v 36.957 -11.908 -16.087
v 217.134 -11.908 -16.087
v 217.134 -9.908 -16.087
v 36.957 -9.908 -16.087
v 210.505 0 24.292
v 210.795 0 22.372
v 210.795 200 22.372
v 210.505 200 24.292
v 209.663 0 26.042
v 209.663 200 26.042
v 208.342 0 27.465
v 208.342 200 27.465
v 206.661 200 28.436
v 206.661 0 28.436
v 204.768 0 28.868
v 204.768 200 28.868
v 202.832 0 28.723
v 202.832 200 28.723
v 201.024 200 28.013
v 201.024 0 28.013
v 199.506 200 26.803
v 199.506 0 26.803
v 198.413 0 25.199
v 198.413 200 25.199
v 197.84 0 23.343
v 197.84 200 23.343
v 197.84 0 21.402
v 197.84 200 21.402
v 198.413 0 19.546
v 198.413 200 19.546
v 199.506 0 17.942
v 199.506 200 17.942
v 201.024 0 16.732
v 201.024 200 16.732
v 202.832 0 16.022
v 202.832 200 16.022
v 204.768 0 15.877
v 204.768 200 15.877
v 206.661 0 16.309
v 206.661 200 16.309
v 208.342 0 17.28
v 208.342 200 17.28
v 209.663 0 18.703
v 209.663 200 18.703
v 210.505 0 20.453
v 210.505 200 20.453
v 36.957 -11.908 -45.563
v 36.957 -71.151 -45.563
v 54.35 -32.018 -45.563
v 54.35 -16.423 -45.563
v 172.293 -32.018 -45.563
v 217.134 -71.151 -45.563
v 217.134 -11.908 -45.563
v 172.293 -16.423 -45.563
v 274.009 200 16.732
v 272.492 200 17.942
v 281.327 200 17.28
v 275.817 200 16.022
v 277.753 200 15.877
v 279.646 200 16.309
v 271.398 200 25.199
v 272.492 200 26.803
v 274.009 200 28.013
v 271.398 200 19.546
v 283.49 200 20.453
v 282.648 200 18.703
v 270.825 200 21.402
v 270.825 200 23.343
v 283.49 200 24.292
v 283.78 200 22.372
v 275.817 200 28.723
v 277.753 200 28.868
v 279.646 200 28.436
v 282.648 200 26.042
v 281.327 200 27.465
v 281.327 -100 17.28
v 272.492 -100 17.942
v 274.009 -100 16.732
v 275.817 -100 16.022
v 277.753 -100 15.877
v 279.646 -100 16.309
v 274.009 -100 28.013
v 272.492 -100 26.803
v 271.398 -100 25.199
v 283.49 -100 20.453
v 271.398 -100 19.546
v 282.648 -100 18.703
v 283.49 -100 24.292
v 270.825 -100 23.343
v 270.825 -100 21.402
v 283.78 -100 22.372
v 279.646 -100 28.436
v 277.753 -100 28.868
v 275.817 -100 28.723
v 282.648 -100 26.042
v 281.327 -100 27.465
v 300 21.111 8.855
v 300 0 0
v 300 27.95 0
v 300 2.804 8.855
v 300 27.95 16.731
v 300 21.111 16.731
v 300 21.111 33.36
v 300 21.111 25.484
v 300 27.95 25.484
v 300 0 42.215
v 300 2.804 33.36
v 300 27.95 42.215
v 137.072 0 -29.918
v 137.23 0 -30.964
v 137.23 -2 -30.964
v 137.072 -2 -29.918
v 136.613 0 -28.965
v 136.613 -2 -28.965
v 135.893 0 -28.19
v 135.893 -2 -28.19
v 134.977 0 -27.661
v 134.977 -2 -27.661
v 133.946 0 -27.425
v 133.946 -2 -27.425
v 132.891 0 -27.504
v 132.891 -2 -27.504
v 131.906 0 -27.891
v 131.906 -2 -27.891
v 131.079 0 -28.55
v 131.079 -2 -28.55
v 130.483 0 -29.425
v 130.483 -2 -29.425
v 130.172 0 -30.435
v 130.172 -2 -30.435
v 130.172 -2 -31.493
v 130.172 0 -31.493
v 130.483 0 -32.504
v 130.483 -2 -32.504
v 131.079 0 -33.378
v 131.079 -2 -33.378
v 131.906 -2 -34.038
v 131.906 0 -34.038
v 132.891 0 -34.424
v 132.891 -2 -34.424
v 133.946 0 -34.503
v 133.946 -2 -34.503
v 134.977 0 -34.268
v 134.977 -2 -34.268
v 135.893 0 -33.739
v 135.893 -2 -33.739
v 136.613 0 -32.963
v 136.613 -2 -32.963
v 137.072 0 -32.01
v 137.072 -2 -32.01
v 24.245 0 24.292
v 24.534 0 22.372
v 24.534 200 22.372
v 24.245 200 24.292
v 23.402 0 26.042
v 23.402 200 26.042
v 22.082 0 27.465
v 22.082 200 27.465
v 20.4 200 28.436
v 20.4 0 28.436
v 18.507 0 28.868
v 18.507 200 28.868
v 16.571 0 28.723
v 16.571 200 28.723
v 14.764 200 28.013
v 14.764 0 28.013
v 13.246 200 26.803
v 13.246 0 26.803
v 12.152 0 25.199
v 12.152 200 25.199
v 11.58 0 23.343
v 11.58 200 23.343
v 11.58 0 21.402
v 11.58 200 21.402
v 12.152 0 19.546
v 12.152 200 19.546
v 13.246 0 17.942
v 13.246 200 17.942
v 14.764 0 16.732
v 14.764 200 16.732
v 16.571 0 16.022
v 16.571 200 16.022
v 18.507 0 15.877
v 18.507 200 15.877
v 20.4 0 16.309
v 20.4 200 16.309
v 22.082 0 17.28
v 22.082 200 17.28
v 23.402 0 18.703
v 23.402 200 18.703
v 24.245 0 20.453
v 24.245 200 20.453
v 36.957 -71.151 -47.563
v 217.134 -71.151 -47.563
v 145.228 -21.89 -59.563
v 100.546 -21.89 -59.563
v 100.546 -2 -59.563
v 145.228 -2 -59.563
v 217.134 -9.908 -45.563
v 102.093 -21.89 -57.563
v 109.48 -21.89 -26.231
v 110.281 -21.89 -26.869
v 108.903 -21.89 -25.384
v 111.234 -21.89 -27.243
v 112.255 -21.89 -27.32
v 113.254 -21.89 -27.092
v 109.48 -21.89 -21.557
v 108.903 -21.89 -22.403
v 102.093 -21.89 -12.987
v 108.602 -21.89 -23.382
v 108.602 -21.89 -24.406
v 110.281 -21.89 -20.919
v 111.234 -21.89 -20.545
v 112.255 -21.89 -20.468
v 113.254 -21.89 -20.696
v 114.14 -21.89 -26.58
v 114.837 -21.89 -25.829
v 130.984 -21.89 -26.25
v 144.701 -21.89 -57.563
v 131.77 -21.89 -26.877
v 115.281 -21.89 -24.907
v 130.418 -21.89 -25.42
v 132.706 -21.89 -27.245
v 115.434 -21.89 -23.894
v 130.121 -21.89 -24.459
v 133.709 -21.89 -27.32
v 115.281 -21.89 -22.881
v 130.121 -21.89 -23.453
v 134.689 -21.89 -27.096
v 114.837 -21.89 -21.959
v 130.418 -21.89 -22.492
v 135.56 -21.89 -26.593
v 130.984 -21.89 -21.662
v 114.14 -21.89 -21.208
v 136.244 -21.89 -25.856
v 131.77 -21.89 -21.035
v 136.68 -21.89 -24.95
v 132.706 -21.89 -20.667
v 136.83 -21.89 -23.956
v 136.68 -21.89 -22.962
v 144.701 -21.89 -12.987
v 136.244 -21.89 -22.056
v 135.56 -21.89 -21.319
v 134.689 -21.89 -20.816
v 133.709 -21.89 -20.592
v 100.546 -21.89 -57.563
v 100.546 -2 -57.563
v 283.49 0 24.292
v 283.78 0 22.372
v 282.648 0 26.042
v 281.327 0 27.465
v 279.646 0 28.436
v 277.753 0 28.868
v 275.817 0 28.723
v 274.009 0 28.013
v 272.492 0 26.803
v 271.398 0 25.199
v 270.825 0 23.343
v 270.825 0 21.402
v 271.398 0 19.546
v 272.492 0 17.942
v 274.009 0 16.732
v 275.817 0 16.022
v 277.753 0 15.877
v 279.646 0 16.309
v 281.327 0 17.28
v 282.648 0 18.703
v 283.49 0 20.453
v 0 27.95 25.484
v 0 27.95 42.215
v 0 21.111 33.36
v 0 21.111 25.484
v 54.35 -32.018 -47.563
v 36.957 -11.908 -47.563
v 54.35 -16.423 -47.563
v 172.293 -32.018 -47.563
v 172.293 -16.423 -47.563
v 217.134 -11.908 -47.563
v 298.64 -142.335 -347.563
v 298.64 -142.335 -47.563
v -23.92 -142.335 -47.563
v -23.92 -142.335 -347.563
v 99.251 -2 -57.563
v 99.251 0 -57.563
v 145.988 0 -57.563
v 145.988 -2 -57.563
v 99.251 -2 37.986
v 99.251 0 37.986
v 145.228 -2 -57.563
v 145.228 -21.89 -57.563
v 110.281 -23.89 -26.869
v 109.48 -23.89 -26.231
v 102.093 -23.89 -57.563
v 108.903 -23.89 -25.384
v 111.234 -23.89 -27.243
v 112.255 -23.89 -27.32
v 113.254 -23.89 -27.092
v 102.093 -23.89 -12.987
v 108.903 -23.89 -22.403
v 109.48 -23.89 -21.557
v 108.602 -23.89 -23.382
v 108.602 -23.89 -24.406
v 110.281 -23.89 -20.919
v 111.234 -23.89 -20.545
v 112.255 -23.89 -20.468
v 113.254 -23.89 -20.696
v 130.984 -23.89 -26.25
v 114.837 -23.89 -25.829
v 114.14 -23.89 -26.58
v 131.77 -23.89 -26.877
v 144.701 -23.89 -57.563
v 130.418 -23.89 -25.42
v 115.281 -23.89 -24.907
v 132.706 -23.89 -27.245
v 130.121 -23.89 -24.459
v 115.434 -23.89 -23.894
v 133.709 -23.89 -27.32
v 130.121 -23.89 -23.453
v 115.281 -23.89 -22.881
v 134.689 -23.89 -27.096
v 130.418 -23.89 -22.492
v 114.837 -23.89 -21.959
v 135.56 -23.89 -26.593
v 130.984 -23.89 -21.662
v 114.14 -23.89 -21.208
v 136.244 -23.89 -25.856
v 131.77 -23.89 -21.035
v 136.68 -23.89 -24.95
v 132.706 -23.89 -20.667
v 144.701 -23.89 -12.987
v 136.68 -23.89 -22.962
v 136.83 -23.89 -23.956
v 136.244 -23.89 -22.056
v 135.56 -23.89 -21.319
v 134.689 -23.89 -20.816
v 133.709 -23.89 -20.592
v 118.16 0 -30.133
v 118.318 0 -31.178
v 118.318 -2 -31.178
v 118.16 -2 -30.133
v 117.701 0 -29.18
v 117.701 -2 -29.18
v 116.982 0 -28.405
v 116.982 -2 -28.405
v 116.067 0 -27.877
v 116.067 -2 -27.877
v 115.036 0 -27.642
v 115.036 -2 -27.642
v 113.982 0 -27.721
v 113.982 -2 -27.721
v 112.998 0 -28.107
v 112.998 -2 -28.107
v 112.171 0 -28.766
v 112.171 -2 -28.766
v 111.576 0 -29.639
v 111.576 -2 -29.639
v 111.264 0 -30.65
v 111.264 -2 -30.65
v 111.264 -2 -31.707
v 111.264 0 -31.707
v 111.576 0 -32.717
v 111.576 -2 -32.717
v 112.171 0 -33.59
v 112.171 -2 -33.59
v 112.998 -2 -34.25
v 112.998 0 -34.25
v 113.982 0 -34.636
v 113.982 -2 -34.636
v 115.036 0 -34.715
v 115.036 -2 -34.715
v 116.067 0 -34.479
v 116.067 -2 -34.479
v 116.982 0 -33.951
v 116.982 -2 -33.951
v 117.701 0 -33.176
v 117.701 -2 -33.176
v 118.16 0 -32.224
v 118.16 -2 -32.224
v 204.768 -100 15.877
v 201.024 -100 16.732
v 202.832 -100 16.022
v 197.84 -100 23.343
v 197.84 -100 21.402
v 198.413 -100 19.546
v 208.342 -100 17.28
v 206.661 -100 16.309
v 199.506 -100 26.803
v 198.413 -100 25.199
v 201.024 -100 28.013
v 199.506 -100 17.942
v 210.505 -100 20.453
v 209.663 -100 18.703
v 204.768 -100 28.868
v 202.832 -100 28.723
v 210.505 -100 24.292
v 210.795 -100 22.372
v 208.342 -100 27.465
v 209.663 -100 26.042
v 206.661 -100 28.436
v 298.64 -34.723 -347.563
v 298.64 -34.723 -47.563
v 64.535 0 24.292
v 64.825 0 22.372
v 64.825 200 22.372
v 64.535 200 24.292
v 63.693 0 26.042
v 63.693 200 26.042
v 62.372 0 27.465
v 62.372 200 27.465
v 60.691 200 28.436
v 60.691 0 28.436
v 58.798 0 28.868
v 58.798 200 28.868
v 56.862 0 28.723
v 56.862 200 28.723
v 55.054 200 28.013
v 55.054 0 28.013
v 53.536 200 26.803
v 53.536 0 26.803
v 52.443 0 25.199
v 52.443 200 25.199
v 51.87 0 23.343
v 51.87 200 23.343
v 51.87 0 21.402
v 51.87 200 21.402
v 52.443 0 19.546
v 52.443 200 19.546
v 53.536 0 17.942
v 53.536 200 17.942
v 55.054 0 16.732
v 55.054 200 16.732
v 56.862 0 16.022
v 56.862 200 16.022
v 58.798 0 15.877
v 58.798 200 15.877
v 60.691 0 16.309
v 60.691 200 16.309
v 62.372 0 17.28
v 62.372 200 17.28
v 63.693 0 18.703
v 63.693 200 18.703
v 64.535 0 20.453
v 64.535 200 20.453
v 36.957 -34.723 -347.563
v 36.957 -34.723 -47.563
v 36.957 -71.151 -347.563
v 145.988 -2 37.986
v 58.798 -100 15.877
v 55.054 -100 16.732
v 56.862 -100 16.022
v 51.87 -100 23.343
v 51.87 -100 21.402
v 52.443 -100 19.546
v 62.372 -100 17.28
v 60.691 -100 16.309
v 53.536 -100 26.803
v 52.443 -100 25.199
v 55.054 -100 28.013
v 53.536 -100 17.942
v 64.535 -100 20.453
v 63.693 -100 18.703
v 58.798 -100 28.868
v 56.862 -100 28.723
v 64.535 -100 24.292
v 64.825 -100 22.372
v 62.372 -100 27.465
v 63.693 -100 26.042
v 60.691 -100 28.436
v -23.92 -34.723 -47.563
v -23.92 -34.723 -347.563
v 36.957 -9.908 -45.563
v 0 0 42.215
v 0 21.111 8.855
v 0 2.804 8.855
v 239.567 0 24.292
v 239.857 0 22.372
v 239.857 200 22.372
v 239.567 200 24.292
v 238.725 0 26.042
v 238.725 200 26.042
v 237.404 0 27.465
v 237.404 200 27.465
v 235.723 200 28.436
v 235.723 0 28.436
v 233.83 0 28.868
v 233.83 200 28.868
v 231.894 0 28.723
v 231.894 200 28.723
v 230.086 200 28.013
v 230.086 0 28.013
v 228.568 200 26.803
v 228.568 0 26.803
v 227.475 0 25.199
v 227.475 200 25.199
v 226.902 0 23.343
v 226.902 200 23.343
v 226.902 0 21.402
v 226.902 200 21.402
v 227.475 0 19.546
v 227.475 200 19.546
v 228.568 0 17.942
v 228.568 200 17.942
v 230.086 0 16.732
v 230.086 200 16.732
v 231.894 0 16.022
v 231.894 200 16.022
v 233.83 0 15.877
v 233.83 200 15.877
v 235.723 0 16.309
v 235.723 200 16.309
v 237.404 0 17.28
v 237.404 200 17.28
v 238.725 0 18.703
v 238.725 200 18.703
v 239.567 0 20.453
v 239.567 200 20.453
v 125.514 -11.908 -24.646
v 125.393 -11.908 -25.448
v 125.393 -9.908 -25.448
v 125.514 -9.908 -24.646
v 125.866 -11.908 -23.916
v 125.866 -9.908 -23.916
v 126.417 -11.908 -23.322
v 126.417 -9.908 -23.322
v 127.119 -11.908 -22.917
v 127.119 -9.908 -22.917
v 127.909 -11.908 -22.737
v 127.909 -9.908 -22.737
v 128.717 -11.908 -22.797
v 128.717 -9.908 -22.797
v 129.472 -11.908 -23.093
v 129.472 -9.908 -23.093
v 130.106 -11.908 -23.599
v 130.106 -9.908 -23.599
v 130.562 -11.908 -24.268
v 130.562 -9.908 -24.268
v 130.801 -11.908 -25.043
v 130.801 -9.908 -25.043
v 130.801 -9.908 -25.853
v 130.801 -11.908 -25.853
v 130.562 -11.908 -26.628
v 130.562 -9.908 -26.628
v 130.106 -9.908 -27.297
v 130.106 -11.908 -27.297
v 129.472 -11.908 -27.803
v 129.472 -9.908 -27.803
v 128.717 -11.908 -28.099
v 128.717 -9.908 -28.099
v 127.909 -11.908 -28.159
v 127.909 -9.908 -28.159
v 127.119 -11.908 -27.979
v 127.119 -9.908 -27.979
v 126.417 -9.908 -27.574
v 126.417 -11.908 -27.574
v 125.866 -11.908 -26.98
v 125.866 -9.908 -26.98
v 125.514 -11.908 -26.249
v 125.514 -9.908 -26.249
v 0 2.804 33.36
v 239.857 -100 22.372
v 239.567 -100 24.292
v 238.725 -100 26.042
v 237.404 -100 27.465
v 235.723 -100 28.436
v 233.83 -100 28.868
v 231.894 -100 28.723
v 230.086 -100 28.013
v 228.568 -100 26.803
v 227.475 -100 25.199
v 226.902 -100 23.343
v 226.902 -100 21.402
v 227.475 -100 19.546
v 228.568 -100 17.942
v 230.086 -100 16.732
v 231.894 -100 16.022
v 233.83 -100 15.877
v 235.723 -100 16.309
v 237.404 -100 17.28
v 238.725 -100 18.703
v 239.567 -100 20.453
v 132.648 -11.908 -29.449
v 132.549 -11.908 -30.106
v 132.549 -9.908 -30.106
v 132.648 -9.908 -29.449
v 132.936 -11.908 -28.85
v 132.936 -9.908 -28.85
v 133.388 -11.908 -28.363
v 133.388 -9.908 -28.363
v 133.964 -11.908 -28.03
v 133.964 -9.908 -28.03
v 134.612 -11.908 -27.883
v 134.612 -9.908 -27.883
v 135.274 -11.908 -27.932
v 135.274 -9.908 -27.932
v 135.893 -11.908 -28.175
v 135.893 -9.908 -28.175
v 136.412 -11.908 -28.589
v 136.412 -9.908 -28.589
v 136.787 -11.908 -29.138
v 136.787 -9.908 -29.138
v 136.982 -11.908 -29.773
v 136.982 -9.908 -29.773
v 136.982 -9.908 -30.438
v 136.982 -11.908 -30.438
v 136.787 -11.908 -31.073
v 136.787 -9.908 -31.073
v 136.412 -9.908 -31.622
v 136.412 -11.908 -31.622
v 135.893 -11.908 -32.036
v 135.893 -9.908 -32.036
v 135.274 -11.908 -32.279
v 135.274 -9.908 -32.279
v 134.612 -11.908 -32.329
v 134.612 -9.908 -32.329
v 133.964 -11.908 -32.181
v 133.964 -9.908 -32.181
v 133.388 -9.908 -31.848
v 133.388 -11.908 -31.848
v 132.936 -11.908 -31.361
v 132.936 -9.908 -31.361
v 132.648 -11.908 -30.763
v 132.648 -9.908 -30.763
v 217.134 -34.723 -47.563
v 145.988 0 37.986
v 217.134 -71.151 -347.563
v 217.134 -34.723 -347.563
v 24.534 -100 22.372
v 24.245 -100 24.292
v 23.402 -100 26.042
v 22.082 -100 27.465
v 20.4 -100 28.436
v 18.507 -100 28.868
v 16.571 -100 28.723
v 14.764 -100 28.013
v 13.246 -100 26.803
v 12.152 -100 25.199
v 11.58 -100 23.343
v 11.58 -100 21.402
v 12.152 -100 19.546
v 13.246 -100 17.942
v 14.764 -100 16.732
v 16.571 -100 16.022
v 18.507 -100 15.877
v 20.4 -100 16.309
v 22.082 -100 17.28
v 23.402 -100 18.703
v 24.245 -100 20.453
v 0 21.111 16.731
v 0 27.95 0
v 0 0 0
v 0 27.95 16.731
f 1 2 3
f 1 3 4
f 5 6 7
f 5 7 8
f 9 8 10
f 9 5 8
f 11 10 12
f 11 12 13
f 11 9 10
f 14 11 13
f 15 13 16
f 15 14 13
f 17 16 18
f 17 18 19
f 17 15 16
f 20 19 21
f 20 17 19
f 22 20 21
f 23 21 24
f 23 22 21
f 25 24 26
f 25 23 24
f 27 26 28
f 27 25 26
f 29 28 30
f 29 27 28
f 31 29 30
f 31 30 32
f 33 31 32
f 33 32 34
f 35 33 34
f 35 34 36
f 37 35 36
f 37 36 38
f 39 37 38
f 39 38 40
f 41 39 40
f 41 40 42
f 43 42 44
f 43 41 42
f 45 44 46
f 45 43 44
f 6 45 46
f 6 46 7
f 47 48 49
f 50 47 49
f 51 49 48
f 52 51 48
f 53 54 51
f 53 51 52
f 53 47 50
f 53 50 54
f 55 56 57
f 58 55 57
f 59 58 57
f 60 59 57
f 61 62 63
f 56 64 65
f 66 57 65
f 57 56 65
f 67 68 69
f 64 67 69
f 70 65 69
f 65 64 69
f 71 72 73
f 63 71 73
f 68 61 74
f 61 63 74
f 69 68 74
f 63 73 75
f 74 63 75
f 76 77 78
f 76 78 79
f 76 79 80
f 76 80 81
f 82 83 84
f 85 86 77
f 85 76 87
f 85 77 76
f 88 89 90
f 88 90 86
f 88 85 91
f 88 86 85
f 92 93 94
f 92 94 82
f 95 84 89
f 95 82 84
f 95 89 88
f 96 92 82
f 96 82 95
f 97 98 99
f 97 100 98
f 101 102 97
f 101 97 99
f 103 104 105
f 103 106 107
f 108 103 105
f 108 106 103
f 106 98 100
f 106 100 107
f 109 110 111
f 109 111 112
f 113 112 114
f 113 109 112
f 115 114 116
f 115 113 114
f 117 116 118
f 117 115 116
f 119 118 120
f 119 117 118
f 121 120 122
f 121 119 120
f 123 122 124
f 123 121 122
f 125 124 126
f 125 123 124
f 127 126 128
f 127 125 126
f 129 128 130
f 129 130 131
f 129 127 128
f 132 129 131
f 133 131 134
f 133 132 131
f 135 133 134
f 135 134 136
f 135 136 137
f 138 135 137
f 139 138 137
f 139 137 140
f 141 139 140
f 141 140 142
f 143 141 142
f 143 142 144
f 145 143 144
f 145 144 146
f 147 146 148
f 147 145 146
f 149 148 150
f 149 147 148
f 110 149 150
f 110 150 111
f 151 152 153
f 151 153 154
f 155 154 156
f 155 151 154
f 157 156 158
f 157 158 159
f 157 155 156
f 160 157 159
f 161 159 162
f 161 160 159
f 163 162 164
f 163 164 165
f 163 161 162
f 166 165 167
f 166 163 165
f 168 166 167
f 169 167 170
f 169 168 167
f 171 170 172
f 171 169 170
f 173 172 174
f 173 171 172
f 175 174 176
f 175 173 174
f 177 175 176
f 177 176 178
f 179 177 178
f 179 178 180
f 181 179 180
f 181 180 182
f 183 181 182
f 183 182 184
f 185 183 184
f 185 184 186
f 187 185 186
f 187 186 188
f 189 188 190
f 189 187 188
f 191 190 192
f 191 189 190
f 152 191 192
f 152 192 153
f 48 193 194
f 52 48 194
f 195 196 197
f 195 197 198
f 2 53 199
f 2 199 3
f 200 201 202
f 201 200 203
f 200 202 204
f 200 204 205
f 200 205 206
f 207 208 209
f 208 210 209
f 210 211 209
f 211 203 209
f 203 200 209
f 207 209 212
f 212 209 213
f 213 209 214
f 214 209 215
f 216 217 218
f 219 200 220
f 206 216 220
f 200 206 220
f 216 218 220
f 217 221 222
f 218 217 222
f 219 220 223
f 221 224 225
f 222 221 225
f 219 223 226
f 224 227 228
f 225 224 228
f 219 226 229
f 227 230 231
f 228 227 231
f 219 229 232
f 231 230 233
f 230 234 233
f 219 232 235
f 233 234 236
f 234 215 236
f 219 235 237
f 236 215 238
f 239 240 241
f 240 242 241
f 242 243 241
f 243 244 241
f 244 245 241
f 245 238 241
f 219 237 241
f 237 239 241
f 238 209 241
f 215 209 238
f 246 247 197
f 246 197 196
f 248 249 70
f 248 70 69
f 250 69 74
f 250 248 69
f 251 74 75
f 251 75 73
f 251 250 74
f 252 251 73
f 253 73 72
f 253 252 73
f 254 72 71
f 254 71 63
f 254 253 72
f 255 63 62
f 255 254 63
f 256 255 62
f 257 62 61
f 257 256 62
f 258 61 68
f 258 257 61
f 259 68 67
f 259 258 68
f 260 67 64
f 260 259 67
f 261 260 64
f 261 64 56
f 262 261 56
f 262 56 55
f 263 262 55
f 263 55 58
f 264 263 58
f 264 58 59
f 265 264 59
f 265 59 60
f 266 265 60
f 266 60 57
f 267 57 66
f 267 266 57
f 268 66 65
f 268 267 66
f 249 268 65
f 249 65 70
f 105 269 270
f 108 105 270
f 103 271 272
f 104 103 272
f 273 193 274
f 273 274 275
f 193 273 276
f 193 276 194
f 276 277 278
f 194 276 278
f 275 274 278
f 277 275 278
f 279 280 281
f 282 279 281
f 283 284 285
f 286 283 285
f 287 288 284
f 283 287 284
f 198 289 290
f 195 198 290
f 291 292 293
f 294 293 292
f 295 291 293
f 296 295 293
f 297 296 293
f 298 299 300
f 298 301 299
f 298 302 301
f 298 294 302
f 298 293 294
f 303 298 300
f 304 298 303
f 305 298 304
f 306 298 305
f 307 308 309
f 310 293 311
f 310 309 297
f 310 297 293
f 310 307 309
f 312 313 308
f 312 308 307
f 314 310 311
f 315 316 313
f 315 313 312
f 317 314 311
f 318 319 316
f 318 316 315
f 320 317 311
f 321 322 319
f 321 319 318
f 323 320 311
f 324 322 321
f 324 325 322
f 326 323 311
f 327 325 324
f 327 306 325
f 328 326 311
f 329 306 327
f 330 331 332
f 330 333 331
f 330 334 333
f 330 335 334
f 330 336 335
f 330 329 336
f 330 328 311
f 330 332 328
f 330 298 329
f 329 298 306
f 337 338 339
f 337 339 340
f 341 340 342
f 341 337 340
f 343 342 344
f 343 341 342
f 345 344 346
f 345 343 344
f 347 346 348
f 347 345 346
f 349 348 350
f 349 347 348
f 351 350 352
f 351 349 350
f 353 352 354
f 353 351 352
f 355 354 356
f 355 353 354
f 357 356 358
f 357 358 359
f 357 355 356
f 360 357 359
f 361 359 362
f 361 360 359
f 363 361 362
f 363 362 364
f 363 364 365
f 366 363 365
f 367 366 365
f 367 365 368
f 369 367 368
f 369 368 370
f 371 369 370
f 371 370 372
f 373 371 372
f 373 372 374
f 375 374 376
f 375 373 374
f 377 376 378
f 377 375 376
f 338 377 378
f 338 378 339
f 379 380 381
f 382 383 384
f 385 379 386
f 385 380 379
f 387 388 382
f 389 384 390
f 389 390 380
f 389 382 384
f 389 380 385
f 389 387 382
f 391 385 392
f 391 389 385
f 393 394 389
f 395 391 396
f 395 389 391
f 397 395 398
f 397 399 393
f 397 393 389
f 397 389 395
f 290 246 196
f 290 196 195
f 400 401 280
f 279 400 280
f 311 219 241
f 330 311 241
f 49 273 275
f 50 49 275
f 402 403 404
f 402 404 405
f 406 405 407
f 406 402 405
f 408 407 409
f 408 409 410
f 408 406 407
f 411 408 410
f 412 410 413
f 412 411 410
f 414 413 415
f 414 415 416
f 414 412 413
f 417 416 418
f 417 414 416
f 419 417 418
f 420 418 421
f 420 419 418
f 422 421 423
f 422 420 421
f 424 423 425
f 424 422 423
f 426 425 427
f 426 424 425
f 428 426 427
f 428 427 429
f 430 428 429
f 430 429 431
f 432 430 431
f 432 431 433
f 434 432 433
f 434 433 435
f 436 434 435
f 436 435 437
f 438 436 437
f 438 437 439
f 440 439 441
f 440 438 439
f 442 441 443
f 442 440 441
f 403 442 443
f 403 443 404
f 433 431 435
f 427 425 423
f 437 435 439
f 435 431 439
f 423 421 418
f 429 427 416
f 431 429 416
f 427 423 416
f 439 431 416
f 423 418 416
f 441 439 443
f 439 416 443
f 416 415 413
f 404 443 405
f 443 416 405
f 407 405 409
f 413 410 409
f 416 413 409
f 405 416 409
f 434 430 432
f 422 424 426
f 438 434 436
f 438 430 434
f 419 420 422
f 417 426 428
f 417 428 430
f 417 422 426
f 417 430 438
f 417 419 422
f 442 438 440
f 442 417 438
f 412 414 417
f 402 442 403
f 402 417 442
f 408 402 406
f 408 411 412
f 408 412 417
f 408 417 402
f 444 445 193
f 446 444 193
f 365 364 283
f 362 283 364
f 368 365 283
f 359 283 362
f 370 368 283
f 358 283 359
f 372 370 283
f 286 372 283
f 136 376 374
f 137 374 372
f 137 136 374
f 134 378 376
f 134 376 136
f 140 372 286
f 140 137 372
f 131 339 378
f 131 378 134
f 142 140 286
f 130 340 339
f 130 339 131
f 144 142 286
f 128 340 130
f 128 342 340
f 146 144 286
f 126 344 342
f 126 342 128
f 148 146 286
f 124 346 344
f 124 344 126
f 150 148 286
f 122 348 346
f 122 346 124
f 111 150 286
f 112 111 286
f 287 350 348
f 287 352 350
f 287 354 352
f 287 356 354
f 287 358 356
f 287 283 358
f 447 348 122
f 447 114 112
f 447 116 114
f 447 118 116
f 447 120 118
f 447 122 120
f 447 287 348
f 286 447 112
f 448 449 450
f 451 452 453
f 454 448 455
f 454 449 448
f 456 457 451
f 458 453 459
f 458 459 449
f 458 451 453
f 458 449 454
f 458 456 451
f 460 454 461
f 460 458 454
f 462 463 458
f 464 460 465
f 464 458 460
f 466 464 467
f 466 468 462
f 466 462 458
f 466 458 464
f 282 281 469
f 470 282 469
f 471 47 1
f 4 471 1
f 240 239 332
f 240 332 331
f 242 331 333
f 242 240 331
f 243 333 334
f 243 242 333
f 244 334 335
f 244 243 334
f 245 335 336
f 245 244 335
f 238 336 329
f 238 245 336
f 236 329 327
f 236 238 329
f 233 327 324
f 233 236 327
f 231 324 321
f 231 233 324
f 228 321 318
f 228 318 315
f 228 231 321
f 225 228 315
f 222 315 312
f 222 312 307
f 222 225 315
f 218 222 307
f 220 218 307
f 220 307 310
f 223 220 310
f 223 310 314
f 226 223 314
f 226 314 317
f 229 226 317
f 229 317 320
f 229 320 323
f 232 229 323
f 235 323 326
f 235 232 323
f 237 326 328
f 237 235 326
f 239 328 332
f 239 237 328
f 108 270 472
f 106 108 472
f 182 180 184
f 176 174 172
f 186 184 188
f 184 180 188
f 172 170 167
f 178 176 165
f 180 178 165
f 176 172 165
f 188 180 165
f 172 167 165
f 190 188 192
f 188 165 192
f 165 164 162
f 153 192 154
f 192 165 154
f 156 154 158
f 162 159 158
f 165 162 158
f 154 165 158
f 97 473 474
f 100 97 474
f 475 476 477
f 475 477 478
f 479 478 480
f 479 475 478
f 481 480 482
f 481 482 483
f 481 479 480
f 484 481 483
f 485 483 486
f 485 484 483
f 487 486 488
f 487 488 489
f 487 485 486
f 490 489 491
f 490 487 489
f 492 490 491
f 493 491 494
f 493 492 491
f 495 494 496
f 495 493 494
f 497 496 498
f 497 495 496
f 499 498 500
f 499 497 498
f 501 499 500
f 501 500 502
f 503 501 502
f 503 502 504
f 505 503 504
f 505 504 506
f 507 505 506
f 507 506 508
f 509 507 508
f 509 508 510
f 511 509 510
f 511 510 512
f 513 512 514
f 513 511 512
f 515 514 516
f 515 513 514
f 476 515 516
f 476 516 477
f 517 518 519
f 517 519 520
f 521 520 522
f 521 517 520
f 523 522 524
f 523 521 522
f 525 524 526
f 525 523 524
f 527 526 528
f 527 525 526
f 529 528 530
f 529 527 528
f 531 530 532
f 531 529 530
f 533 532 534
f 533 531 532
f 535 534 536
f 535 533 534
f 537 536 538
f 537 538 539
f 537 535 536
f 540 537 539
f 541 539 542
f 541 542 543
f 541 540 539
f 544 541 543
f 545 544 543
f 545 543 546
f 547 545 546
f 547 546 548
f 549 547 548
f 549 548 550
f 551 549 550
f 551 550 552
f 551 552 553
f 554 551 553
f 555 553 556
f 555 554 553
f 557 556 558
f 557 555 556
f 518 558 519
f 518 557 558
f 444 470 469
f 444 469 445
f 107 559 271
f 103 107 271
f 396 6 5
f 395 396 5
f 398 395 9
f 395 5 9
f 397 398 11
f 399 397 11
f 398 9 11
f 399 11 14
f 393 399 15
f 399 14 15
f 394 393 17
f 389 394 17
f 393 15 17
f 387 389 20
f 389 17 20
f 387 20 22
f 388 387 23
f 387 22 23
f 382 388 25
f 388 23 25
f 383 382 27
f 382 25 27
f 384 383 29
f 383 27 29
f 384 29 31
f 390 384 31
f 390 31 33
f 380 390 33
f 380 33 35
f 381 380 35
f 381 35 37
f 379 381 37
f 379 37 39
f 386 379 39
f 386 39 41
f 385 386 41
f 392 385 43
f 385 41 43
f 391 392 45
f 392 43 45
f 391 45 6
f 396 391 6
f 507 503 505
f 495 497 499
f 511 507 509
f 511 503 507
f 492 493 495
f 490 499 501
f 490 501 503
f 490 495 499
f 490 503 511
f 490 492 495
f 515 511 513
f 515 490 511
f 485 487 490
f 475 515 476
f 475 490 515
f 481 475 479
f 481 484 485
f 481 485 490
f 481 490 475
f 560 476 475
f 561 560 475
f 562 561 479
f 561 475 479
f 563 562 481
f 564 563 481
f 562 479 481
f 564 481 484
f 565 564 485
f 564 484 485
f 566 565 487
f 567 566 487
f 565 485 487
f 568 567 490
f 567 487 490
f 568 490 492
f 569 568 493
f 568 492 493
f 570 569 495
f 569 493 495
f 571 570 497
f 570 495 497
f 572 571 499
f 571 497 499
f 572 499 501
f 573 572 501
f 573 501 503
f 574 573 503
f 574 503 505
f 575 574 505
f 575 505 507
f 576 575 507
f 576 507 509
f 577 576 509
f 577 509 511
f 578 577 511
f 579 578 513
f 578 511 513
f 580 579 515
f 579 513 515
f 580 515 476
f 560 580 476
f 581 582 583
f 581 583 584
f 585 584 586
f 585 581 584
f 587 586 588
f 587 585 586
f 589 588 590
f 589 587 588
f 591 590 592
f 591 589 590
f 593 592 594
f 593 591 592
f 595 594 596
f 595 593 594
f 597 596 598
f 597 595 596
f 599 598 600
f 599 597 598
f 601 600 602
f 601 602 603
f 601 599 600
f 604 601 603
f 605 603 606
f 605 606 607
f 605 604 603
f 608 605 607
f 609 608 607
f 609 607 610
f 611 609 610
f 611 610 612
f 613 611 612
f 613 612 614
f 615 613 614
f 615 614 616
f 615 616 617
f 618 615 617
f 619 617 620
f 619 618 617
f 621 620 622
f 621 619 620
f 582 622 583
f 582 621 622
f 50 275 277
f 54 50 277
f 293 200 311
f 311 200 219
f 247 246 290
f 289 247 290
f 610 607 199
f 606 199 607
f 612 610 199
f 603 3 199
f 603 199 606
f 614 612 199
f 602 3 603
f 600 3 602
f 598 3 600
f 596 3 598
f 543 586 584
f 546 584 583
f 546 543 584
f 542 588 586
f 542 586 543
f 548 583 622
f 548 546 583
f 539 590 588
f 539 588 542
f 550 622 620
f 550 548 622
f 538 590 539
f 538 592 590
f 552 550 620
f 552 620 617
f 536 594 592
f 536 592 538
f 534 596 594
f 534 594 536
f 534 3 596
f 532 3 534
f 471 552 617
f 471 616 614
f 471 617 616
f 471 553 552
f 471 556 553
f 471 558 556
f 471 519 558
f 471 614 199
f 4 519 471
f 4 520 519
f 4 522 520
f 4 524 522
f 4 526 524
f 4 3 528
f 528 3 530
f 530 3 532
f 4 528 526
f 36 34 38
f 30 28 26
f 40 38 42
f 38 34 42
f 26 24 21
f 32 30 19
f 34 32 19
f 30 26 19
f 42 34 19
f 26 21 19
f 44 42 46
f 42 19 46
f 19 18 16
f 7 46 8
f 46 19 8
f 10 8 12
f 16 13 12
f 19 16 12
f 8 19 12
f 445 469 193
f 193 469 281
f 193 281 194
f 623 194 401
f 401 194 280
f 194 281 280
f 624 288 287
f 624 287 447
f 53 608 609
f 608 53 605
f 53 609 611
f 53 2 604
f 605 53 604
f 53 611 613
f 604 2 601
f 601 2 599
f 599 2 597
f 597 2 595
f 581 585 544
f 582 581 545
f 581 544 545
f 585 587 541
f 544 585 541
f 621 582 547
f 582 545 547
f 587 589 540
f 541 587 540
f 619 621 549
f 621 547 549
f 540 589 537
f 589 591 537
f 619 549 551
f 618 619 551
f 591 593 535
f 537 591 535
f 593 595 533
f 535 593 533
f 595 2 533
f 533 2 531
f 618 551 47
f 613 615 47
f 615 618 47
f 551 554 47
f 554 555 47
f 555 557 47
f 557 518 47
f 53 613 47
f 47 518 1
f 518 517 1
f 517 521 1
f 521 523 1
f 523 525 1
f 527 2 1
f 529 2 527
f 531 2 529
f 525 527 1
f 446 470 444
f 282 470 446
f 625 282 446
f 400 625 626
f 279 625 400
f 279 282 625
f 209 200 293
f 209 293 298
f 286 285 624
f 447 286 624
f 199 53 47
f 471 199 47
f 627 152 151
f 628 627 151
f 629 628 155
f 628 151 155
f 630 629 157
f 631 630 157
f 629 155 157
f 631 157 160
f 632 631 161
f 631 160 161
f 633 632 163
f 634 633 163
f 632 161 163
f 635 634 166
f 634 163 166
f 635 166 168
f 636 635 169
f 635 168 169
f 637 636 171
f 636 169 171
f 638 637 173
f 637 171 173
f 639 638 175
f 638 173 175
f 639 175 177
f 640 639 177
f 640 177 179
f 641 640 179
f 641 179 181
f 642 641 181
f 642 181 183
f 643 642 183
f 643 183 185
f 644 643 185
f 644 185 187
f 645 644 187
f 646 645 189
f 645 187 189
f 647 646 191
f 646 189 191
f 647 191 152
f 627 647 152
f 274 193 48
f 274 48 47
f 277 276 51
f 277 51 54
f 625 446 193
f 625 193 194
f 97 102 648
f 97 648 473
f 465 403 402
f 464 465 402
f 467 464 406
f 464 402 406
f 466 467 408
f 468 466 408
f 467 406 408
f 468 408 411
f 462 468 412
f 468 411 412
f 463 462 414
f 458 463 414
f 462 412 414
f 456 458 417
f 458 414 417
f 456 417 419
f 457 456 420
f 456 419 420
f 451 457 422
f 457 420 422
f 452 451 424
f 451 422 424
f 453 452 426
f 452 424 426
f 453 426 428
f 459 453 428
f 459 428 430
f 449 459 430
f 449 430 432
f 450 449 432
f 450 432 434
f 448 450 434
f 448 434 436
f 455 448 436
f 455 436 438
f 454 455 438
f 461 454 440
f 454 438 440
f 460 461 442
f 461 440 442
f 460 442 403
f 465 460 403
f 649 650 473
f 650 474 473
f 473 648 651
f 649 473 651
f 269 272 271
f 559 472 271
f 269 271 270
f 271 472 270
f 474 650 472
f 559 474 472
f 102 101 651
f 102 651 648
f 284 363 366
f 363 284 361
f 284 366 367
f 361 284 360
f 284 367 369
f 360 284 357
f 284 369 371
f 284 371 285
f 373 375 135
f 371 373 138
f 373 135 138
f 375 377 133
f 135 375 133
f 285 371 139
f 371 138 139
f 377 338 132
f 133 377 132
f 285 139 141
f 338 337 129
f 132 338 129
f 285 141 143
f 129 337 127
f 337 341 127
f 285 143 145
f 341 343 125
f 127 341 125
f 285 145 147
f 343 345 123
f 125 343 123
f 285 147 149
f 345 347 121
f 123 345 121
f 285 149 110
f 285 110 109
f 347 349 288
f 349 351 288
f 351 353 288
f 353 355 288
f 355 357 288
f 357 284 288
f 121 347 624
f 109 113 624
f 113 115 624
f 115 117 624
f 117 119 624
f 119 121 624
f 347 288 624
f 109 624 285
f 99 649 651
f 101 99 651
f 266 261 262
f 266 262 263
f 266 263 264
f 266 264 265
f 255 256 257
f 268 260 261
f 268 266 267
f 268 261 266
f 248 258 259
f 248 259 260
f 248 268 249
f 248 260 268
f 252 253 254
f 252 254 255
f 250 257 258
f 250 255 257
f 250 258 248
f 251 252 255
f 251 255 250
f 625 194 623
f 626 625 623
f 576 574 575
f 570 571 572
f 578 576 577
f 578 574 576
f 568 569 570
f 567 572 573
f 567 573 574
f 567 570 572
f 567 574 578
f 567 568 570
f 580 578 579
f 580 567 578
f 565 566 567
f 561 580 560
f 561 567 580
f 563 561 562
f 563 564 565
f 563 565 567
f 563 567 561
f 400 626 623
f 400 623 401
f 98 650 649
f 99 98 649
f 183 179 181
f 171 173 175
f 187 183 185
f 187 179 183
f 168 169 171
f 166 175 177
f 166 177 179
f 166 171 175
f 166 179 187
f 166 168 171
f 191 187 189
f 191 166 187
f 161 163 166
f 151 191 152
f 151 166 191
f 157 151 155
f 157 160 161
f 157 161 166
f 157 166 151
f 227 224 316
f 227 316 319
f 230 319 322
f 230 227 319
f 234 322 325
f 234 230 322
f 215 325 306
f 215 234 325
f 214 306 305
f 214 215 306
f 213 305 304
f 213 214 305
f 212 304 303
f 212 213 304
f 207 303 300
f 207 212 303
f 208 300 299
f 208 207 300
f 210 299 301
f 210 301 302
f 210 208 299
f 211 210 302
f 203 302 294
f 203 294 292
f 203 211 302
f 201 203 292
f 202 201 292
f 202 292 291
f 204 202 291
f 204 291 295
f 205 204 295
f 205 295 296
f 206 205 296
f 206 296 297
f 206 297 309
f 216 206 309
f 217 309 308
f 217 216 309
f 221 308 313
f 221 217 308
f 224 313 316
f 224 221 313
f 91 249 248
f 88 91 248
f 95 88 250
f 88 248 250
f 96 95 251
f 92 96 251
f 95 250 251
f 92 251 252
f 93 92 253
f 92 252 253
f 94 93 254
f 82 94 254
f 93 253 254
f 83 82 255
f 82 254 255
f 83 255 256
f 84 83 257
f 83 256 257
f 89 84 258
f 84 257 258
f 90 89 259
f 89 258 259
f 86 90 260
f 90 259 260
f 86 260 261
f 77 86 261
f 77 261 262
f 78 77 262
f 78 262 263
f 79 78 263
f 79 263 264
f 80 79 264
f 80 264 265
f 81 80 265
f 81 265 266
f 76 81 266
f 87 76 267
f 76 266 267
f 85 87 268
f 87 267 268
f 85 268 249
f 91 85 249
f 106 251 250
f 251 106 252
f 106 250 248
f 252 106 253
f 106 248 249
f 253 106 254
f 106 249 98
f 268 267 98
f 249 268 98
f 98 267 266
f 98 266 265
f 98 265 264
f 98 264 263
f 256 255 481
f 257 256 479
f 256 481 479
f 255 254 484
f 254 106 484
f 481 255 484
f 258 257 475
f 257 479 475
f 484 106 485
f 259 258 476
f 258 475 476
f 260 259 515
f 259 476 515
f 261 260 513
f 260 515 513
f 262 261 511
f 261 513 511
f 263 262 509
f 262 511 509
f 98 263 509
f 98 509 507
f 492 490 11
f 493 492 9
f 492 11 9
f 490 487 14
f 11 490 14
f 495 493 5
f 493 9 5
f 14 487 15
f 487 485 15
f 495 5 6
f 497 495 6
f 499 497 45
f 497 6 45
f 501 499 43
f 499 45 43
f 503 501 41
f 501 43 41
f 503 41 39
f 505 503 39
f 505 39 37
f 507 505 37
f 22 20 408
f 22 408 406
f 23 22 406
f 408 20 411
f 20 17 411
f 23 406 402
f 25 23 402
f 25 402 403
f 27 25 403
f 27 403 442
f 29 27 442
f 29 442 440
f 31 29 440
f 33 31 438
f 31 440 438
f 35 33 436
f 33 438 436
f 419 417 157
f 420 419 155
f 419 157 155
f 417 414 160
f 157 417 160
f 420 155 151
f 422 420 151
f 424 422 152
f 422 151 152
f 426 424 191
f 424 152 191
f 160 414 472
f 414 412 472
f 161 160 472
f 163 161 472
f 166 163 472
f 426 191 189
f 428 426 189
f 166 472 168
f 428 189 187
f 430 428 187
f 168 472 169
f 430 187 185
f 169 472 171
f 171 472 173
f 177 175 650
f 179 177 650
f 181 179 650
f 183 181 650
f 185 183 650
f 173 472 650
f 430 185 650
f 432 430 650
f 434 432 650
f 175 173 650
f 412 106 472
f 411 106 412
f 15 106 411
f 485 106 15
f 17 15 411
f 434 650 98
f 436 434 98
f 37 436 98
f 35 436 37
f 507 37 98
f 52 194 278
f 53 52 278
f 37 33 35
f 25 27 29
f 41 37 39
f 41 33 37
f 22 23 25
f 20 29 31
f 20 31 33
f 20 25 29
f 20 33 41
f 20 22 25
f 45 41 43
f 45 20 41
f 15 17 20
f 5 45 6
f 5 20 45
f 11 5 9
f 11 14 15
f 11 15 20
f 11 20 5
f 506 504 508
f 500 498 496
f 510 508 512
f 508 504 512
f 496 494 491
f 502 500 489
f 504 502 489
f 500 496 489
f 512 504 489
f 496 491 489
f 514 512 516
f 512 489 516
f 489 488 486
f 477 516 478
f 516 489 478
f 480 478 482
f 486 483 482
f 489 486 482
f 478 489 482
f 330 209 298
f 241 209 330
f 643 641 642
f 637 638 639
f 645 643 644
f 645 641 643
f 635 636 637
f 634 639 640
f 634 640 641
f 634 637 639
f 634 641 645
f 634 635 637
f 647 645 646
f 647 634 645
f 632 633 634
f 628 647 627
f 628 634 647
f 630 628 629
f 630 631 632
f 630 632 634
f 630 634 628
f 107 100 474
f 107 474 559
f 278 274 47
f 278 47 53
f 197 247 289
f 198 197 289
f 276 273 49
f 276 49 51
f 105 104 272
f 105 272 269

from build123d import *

# Parameters (mm, degrees)
F1_DEPTH  = 300
F2_W      = 46.7377305031
F2_H      = 37.9861071706
F2_H_2    = 57.5625300407
F2_R      = 3.5464845082
F2_R_2    = 3.5487842395
F3_DEPTH  = 2
F4_W      = 44.6821078658
F4_H      = 19.8899268657
F5_DEPTH  = 2
F6_W      = 42.6081120968
F6_H      = 44.5759128779
F6_R      = 3.435329419
F6_R_2    = 3.3732396527
F7_DEPTH  = 2
F9_W      = 180.1773458719
F9_H      = 59.2437896412
F9_W_2    = 117.9433763027
F9_H_2    = 15.5952386558
F10_DEPTH = 2
F11_W     = 180.1773458719
F11_H     = 29.4754692465
F11_R     = 2.2291737864
F11_R_2   = 2.7189611164
F12_DEPTH = 2
F14_DEPTH = 300
F15_R     = 6.5135337173
F16_DEPTH = 100
F17_DEPTH = 200


with BuildPart() as f1:
    # F0 (on Right) → F1 (new body)
    with BuildSketch(Plane.YZ):
        Polygon((0, 42.2146357596), (0, 0), (27.9495714174, 0), (27.9495714174, 16.7309522358), (21.111213831, 16.7309522358), (21.111213831, 8.854838892), (2.8035883623, 8.854838892), (2.8035883623, 33.3597968676), (21.111213831, 33.3597968676), (21.111213831, 25.4836835238), (27.9495714174, 25.4836835238), (27.9495714174, 42.2146357596), align=None)
    extrude(amount=F1_DEPTH)

    # F15 (on face) → F16 (join)
    with BuildSketch(Plane.XZ):
        with Locations((277.2662639618, 22.3724991083)):
            Circle(F15_R)
        with Locations((233.3431243896, 22.3724991083)):
            Circle(F15_R)
        with Locations((204.2811959982, 22.3724991083)):
            Circle(F15_R)
        with Locations((58.3110898733, 22.3724991083)):
            Circle(F15_R)
        with Locations((18.0206950754, 22.3724991083)):
            Circle(F15_R)
    extrude(amount=F16_DEPTH)


with BuildPart() as f3:
    # F2 (on face) → F3 (new body)
    with BuildSketch(Plane.XZ):
        with Locations((122.61942029, 18.9930535853)):
            Rectangle(F2_W, F2_H)
        with Locations((122.61942029, -28.7812650204)):
            Rectangle(F2_W, F2_H_2)
        with Locations((114.7710829973, -31.1781652272)):
            Circle(F2_R, mode=Mode.SUBTRACT)
        with Locations((133.6807757616, -30.9642702341)):
            Circle(F2_R_2, mode=Mode.SUBTRACT)
    extrude(amount=F3_DEPTH)


with BuildPart() as f5:
    # F4 (on face) → F5 (new body)
    with BuildSketch(Plane(origin=(0, 0, -57.5625300407), x_dir=(1, 0, 0), z_dir=(0, 0, -1))):
        with Locations((122.8873170912, 11.9449634328)):
            Rectangle(F4_W, F4_H)
    extrude(amount=F5_DEPTH)


with BuildPart() as f7:
    # F6 (on face) → F7 (new body)
    with BuildSketch(Plane.XZ.offset(21.8899268657)):
        with Locations((123.397231102, -35.2745736018)):
            Rectangle(F6_W, F6_H)
        with Locations((111.9984835386, -23.8939598203)):
            Circle(F6_R, mode=Mode.SUBTRACT)
        with Locations((133.4570199251, -23.9559654146)):
            Circle(F6_R_2, mode=Mode.SUBTRACT)
    extrude(amount=F7_DEPTH)


with BuildPart() as f10:
    # F9 (on offset) → F10 (new body)
    with BuildSketch(Plane.XY.offset(-47.5625300407)):
        with Locations((127.0454749465, -41.5296001593)):
            Rectangle(F9_W, F9_H)
        with Locations((113.3212447166, -24.2201592773)):
            Rectangle(F9_W_2, F9_H_2, mode=Mode.SUBTRACT)
    extrude(amount=F10_DEPTH)


with BuildPart() as f12:
    # F11 (on face) → F12 (new body)
    with BuildSketch(Plane(origin=(0, -11.9077053387, 0), x_dir=(-1, 0, 0), z_dir=(0, 1, 0))):
        with Locations((-127.0454749465, -30.8247954175)):
            Rectangle(F11_W, F11_H)
        with Locations((-134.77820158, -30.1055759192)):
            Circle(F11_R, mode=Mode.SUBTRACT)
        with Locations((-128.1123906374, -25.4479255527)):
            Circle(F11_R_2, mode=Mode.SUBTRACT)
    extrude(amount=F12_DEPTH)


with BuildPart() as f14:
    # F13 (on face) → F14 (new body)
    with BuildSketch(Plane(origin=(0, 0, -47.5625300407), x_dir=(1, 0, 0), z_dir=(0, 0, -1))):
        Polygon((298.6398339272, 142.3349231482), (-23.9203404635, 142.3349231482), (-23.9203404635, 34.7228944302), (36.9568020105, 34.7228944302), (36.9568020105, 71.1514949799), (217.1341478825, 71.1514949799), (217.1341478825, 34.7228944302), (298.6398339272, 34.7228944302), align=None)
    extrude(amount=F14_DEPTH)


with BuildPart() as f17:
    # F15 (on face) → F17 (new body)
    with BuildSketch(Plane.XZ):
        with Locations((277.2662639618, 22.3724991083)):
            Circle(F15_R)
    extrude(amount=-F17_DEPTH)


with BuildPart() as f17b:
    # F15 (on face) → F17, piece 2 (new body)
    with BuildSketch(Plane.XZ):
        with Locations((233.3431243896, 22.3724991083)):
            Circle(F15_R)
    extrude(amount=-F17_DEPTH)


with BuildPart() as f17c:
    # F15 (on face) → F17, piece 3 (new body)
    with BuildSketch(Plane.XZ):
        with Locations((204.2811959982, 22.3724991083)):
            Circle(F15_R)
    extrude(amount=-F17_DEPTH)


with BuildPart() as f17d:
    # F15 (on face) → F17, piece 4 (new body)
    with BuildSketch(Plane.XZ):
        with Locations((58.3110898733, 22.3724991083)):
            Circle(F15_R)
    extrude(amount=-F17_DEPTH)


with BuildPart() as f17e:
    # F15 (on face) → F17, piece 5 (new body)
    with BuildSketch(Plane.XZ):
        with Locations((18.0206950754, 22.3724991083)):
            Circle(F15_R)
    extrude(amount=-F17_DEPTH)


solid = Compound([f1.part, f3.part, f5.part, f7.part, f10.part, f12.part, f14.part, f17.part, f17b.part, f17c.part, f17d.part, f17e.part])
